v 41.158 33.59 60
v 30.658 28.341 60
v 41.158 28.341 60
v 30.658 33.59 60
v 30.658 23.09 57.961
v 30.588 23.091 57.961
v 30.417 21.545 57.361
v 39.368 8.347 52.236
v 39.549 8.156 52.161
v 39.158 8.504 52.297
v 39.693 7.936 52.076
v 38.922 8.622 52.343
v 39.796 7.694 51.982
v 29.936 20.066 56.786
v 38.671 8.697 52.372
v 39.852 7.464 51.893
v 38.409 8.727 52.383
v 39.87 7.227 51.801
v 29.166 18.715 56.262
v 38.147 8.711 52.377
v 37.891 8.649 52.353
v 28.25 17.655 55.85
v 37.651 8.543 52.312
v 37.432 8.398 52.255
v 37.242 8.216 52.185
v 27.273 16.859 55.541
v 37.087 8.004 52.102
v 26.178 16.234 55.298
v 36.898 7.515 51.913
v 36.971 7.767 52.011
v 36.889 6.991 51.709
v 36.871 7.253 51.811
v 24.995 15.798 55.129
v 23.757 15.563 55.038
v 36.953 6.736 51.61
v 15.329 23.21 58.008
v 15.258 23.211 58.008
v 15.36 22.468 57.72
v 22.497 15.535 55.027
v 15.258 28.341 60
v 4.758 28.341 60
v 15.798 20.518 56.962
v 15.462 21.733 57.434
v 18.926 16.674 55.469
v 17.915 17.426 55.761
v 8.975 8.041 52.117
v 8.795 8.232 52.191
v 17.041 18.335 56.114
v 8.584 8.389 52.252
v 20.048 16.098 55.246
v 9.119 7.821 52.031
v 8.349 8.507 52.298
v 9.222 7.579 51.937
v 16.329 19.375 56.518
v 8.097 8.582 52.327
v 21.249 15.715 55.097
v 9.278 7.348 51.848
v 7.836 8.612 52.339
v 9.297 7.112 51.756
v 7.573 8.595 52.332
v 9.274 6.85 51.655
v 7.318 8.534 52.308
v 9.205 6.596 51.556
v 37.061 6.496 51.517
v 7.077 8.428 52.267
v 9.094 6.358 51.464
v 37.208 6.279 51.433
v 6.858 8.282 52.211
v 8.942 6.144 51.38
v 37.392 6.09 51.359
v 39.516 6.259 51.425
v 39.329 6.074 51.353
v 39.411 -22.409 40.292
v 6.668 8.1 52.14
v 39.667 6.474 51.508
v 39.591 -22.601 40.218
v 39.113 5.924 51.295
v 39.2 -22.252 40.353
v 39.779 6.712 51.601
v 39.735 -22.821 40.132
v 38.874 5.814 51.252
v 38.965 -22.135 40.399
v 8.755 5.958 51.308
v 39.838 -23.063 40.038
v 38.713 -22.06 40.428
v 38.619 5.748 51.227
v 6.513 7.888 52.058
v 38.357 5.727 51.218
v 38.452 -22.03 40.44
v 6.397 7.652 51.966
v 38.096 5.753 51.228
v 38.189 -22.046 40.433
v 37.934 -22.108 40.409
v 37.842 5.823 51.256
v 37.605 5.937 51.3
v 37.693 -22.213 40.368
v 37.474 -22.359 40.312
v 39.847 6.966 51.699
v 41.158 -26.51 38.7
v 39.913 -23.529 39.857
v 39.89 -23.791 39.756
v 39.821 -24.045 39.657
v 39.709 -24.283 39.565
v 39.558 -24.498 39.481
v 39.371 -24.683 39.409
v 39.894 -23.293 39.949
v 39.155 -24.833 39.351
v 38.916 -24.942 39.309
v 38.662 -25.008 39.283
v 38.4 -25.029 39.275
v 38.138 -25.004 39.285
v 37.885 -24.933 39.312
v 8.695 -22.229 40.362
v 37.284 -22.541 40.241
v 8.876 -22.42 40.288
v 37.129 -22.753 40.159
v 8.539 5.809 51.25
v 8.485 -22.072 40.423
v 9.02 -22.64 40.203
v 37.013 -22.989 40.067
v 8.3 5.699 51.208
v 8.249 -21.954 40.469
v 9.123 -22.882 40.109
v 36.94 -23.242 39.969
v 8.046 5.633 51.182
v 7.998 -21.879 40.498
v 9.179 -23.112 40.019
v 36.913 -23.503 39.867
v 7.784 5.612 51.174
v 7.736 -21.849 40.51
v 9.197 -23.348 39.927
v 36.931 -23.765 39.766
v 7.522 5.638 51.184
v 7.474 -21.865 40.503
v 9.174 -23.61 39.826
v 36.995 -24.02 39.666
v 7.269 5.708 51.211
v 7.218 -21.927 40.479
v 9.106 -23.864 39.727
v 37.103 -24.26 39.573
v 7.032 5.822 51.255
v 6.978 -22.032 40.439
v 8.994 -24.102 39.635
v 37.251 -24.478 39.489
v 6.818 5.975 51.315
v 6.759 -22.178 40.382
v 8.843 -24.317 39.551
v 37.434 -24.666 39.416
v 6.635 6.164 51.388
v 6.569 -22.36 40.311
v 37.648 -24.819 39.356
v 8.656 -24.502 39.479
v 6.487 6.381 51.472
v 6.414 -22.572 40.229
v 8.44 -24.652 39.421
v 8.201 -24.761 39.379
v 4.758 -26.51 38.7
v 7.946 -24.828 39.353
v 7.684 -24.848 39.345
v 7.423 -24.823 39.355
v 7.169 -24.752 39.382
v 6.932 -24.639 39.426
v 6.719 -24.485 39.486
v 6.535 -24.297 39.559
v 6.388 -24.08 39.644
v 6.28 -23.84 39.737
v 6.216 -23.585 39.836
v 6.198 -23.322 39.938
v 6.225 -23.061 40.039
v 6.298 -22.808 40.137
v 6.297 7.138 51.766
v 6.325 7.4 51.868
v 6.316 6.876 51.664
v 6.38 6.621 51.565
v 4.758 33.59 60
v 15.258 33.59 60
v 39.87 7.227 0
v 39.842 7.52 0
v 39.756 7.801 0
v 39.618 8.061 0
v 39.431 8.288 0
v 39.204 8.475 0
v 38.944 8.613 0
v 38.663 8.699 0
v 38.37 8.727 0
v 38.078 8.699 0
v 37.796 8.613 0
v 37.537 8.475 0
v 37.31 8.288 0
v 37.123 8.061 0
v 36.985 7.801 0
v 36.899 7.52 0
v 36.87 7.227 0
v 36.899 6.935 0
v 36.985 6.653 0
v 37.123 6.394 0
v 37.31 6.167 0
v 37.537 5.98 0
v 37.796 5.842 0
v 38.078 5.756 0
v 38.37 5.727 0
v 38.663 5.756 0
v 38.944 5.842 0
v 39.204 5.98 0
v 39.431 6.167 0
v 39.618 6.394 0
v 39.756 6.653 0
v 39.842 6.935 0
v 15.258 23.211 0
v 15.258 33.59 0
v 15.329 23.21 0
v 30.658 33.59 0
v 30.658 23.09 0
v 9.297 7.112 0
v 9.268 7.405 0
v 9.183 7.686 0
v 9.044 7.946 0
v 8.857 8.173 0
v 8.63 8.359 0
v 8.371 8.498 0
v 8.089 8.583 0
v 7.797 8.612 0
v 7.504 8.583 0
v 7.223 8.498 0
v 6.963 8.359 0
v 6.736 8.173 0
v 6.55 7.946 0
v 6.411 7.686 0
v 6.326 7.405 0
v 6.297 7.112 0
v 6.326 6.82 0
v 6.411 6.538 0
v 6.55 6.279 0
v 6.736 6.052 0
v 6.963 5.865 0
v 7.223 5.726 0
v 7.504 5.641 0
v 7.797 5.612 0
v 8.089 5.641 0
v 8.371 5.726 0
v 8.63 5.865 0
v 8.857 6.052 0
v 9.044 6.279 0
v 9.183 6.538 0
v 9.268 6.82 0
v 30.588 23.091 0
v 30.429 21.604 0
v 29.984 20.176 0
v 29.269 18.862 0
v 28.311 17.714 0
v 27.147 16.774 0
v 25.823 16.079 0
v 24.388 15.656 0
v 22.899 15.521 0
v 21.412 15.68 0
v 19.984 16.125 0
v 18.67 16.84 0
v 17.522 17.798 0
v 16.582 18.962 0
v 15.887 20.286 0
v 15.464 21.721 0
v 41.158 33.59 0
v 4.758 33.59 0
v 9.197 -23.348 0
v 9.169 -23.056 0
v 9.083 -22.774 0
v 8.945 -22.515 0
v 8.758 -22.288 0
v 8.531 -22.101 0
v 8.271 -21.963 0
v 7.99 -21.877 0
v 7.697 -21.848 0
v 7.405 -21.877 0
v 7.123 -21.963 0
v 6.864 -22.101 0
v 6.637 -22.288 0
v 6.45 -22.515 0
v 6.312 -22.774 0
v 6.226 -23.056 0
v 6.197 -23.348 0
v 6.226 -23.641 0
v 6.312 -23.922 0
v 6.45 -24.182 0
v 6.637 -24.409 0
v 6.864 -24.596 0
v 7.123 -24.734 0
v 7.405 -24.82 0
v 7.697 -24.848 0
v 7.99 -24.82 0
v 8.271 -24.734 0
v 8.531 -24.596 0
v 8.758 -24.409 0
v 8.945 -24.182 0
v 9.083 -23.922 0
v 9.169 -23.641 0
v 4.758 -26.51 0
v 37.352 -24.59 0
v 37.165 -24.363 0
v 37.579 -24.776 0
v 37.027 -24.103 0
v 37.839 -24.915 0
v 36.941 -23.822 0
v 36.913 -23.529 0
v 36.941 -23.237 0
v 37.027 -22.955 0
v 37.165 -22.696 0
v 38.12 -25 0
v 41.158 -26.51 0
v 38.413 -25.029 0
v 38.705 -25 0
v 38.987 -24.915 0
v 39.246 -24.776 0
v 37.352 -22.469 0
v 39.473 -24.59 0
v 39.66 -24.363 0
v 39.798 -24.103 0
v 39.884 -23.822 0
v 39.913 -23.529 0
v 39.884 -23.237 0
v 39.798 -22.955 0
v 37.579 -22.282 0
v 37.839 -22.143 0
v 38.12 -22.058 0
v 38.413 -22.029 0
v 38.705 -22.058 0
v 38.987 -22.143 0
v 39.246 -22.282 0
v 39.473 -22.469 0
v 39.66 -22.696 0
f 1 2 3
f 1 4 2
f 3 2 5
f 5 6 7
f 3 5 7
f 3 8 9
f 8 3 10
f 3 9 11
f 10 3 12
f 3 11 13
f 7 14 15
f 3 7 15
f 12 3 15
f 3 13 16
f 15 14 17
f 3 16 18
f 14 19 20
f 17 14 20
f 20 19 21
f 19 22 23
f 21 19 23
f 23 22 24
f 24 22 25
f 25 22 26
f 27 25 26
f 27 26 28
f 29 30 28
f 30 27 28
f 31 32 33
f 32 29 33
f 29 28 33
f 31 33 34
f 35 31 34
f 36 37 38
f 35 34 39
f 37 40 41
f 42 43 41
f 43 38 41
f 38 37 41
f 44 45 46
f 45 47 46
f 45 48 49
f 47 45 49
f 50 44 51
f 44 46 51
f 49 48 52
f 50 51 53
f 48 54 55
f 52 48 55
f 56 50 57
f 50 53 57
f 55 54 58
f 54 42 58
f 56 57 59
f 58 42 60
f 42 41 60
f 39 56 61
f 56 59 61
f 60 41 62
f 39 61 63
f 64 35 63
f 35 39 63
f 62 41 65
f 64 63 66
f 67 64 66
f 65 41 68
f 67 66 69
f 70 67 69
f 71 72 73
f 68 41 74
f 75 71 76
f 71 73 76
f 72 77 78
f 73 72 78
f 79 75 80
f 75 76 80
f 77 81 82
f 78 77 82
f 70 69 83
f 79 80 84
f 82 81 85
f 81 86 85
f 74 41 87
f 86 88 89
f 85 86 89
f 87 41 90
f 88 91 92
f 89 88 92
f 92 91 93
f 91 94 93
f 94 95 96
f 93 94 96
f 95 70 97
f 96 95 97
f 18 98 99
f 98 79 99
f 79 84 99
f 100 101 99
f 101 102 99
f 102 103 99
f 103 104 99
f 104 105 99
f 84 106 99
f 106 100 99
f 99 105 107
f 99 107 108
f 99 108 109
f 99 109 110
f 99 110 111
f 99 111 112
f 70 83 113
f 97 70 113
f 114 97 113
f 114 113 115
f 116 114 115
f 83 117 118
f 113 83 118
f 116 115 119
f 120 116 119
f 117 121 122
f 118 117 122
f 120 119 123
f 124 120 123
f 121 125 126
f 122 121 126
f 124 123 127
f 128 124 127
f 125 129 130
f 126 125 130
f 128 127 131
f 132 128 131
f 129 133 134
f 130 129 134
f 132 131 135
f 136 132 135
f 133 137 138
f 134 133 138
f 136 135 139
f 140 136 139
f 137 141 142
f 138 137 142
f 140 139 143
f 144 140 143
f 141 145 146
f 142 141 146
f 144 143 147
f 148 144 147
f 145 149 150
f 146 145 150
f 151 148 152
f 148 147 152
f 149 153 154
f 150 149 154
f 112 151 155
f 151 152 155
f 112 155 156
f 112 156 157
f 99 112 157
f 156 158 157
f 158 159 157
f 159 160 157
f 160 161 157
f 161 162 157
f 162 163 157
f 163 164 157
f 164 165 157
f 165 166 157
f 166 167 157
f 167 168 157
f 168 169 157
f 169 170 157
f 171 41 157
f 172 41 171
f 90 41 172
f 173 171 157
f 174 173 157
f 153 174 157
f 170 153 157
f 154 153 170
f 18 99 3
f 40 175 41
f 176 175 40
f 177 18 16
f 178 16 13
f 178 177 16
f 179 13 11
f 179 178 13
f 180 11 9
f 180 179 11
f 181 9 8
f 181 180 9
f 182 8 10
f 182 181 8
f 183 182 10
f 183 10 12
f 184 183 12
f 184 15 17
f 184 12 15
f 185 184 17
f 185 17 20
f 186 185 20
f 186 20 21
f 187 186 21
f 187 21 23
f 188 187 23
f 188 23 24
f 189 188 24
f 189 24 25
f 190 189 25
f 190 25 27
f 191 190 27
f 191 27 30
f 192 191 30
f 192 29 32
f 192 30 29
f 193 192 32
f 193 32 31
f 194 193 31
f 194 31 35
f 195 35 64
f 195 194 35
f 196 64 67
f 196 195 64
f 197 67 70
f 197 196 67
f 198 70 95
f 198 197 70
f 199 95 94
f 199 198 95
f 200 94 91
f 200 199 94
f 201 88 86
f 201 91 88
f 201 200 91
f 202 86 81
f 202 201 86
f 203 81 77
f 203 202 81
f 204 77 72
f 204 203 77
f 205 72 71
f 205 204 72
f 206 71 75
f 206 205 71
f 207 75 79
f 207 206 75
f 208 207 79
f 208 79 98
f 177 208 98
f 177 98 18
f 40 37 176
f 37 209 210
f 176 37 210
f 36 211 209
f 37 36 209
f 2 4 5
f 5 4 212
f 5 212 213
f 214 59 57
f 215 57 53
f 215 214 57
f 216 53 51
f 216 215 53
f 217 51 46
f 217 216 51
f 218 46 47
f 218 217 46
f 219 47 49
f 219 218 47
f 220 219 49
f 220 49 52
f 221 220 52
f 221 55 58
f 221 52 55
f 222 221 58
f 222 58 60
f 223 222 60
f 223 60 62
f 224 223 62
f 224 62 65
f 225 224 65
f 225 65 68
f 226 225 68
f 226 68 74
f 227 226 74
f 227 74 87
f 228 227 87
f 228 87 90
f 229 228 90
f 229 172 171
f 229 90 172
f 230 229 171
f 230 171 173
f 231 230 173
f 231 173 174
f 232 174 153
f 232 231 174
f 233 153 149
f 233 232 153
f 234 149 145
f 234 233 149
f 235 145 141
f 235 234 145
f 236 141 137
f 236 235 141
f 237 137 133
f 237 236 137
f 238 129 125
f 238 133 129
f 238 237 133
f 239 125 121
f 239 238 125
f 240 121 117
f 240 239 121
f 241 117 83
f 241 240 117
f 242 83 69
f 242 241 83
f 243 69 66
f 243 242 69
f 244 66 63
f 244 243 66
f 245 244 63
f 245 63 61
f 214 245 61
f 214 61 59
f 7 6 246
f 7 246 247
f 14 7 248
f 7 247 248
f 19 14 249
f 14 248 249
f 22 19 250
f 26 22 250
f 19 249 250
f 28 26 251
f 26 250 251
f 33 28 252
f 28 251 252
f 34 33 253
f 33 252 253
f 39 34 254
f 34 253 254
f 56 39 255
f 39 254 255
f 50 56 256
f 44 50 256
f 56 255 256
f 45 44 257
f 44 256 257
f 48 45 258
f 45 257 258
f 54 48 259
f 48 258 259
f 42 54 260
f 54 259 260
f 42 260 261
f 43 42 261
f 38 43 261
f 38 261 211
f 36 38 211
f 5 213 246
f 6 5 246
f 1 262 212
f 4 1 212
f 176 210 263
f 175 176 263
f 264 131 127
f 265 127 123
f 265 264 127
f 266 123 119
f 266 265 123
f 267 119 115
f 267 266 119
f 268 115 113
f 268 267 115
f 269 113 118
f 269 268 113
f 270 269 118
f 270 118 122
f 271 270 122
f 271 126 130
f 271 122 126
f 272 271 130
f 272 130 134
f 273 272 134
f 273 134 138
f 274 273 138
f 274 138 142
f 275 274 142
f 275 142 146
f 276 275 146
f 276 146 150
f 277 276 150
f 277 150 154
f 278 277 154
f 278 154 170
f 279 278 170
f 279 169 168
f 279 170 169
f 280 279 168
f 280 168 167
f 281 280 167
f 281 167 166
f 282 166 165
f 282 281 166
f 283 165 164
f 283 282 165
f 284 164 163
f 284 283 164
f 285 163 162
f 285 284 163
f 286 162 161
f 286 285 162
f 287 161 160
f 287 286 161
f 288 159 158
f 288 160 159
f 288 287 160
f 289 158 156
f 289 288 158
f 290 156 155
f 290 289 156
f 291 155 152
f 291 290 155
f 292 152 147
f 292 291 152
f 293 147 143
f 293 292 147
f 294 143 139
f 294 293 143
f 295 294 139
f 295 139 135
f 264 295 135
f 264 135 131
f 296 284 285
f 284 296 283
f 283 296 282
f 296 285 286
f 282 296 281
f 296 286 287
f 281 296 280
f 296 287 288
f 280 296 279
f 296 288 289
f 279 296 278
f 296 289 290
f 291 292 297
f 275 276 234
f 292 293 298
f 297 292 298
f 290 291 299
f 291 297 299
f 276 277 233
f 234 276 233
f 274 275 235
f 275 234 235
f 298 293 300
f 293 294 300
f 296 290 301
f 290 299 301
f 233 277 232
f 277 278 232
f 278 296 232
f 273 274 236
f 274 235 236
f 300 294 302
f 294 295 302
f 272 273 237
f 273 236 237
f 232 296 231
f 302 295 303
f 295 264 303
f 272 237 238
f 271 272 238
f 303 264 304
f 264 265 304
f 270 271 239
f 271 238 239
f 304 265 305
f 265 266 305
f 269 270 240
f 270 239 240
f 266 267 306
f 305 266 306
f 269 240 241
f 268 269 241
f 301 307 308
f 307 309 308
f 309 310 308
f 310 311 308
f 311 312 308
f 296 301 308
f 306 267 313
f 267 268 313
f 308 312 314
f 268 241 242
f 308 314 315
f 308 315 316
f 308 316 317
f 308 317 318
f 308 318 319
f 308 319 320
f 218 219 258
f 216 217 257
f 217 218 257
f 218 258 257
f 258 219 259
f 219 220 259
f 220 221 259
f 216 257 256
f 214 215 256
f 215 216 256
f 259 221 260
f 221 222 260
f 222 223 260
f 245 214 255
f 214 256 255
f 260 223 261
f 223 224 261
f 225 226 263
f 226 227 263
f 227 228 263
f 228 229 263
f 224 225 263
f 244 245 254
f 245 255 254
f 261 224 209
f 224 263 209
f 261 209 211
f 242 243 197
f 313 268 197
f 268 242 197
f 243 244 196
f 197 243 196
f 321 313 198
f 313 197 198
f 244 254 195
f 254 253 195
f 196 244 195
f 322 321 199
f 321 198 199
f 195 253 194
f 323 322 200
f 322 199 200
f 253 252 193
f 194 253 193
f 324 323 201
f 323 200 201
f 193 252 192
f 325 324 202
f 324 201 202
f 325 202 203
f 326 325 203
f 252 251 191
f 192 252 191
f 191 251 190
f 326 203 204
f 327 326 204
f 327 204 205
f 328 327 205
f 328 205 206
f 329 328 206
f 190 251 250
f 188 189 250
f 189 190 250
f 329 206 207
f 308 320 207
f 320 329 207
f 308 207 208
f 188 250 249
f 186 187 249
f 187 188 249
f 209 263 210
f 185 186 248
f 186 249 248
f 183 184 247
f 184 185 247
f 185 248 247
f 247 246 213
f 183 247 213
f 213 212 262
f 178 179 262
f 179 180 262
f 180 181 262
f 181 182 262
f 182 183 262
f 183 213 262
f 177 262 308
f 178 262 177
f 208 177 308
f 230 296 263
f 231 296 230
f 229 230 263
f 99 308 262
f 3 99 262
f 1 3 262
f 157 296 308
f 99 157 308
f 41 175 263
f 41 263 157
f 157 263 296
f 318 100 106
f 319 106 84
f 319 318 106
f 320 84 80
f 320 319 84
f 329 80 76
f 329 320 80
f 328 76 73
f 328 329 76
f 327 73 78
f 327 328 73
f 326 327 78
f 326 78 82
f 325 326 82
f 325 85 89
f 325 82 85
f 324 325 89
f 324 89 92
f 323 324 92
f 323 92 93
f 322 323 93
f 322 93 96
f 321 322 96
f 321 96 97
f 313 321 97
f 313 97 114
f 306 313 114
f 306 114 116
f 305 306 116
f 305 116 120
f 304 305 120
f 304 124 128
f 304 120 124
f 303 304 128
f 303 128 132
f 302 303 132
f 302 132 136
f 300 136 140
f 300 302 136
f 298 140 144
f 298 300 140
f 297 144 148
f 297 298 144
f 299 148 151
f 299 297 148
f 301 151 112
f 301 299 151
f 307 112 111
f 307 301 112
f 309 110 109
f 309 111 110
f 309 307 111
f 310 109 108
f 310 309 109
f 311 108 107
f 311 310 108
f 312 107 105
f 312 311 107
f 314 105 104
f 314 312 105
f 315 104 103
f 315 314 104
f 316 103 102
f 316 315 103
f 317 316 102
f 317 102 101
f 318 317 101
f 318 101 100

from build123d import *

# Parameters (mm, degrees)
F0_R     = 1.5
F1_DEPTH = 60
F3_DEPTH = 36.401


with BuildPart() as f1:
    # F0 (on Top) → F1 (new body)
    with BuildSketch(Plane.XY):
        with BuildLine():
            Line((41.158495, -26.509628), (41.158495, 9.990372))
            Line((41.158495, 9.990372), (41.158495, 33.590372))
            Line((41.158495, 33.590372), (30.658495, 33.590372))
            Line((30.658495, 33.590372), (30.658495, 23.090372))
            Line((30.658495, 23.090372), (30.587656, 23.090927))
            ThreePointArc((30.587656, 23.090927), (22.898785, 15.521476), (15.329334, 23.210347))
            Line((15.329334, 23.210347), (15.258495, 23.210902))
            Line((15.258495, 23.210902), (15.258495, 33.590372))
            Line((15.258495, 33.590372), (4.758495, 33.590372))
            Line((4.758495, 33.590372), (4.758495, 9.990372))
            Line((4.758495, 9.990372), (4.758495, -26.509628))
            Line((4.758495, -26.509628), (41.158495, -26.509628))
        make_face()
        with Locations((7.697332, -23.348416)):
            Circle(F0_R, mode=Mode.SUBTRACT)
        with Locations((38.412604, -23.529183)):
            Circle(F0_R, mode=Mode.SUBTRACT)
        with Locations((7.79681, 7.112169)):
            Circle(F0_R, mode=Mode.SUBTRACT)
        with Locations((38.370336, 7.227415)):
            Circle(F0_R, mode=Mode.SUBTRACT)
    extrude(amount=F1_DEPTH)

    # F2 (on face) → F3 (cut, through all)
    with BuildSketch(Plane(origin=(4.758495, 0, 0), x_dir=(0, -1, 0), z_dir=(-1, 0, 0))):
        Polygon((26.509628, 60), (-28.34104, 60), (26.509628, 38.699873), align=None)
    extrude(amount=-F3_DEPTH, mode=Mode.SUBTRACT)


solid = f1.part
